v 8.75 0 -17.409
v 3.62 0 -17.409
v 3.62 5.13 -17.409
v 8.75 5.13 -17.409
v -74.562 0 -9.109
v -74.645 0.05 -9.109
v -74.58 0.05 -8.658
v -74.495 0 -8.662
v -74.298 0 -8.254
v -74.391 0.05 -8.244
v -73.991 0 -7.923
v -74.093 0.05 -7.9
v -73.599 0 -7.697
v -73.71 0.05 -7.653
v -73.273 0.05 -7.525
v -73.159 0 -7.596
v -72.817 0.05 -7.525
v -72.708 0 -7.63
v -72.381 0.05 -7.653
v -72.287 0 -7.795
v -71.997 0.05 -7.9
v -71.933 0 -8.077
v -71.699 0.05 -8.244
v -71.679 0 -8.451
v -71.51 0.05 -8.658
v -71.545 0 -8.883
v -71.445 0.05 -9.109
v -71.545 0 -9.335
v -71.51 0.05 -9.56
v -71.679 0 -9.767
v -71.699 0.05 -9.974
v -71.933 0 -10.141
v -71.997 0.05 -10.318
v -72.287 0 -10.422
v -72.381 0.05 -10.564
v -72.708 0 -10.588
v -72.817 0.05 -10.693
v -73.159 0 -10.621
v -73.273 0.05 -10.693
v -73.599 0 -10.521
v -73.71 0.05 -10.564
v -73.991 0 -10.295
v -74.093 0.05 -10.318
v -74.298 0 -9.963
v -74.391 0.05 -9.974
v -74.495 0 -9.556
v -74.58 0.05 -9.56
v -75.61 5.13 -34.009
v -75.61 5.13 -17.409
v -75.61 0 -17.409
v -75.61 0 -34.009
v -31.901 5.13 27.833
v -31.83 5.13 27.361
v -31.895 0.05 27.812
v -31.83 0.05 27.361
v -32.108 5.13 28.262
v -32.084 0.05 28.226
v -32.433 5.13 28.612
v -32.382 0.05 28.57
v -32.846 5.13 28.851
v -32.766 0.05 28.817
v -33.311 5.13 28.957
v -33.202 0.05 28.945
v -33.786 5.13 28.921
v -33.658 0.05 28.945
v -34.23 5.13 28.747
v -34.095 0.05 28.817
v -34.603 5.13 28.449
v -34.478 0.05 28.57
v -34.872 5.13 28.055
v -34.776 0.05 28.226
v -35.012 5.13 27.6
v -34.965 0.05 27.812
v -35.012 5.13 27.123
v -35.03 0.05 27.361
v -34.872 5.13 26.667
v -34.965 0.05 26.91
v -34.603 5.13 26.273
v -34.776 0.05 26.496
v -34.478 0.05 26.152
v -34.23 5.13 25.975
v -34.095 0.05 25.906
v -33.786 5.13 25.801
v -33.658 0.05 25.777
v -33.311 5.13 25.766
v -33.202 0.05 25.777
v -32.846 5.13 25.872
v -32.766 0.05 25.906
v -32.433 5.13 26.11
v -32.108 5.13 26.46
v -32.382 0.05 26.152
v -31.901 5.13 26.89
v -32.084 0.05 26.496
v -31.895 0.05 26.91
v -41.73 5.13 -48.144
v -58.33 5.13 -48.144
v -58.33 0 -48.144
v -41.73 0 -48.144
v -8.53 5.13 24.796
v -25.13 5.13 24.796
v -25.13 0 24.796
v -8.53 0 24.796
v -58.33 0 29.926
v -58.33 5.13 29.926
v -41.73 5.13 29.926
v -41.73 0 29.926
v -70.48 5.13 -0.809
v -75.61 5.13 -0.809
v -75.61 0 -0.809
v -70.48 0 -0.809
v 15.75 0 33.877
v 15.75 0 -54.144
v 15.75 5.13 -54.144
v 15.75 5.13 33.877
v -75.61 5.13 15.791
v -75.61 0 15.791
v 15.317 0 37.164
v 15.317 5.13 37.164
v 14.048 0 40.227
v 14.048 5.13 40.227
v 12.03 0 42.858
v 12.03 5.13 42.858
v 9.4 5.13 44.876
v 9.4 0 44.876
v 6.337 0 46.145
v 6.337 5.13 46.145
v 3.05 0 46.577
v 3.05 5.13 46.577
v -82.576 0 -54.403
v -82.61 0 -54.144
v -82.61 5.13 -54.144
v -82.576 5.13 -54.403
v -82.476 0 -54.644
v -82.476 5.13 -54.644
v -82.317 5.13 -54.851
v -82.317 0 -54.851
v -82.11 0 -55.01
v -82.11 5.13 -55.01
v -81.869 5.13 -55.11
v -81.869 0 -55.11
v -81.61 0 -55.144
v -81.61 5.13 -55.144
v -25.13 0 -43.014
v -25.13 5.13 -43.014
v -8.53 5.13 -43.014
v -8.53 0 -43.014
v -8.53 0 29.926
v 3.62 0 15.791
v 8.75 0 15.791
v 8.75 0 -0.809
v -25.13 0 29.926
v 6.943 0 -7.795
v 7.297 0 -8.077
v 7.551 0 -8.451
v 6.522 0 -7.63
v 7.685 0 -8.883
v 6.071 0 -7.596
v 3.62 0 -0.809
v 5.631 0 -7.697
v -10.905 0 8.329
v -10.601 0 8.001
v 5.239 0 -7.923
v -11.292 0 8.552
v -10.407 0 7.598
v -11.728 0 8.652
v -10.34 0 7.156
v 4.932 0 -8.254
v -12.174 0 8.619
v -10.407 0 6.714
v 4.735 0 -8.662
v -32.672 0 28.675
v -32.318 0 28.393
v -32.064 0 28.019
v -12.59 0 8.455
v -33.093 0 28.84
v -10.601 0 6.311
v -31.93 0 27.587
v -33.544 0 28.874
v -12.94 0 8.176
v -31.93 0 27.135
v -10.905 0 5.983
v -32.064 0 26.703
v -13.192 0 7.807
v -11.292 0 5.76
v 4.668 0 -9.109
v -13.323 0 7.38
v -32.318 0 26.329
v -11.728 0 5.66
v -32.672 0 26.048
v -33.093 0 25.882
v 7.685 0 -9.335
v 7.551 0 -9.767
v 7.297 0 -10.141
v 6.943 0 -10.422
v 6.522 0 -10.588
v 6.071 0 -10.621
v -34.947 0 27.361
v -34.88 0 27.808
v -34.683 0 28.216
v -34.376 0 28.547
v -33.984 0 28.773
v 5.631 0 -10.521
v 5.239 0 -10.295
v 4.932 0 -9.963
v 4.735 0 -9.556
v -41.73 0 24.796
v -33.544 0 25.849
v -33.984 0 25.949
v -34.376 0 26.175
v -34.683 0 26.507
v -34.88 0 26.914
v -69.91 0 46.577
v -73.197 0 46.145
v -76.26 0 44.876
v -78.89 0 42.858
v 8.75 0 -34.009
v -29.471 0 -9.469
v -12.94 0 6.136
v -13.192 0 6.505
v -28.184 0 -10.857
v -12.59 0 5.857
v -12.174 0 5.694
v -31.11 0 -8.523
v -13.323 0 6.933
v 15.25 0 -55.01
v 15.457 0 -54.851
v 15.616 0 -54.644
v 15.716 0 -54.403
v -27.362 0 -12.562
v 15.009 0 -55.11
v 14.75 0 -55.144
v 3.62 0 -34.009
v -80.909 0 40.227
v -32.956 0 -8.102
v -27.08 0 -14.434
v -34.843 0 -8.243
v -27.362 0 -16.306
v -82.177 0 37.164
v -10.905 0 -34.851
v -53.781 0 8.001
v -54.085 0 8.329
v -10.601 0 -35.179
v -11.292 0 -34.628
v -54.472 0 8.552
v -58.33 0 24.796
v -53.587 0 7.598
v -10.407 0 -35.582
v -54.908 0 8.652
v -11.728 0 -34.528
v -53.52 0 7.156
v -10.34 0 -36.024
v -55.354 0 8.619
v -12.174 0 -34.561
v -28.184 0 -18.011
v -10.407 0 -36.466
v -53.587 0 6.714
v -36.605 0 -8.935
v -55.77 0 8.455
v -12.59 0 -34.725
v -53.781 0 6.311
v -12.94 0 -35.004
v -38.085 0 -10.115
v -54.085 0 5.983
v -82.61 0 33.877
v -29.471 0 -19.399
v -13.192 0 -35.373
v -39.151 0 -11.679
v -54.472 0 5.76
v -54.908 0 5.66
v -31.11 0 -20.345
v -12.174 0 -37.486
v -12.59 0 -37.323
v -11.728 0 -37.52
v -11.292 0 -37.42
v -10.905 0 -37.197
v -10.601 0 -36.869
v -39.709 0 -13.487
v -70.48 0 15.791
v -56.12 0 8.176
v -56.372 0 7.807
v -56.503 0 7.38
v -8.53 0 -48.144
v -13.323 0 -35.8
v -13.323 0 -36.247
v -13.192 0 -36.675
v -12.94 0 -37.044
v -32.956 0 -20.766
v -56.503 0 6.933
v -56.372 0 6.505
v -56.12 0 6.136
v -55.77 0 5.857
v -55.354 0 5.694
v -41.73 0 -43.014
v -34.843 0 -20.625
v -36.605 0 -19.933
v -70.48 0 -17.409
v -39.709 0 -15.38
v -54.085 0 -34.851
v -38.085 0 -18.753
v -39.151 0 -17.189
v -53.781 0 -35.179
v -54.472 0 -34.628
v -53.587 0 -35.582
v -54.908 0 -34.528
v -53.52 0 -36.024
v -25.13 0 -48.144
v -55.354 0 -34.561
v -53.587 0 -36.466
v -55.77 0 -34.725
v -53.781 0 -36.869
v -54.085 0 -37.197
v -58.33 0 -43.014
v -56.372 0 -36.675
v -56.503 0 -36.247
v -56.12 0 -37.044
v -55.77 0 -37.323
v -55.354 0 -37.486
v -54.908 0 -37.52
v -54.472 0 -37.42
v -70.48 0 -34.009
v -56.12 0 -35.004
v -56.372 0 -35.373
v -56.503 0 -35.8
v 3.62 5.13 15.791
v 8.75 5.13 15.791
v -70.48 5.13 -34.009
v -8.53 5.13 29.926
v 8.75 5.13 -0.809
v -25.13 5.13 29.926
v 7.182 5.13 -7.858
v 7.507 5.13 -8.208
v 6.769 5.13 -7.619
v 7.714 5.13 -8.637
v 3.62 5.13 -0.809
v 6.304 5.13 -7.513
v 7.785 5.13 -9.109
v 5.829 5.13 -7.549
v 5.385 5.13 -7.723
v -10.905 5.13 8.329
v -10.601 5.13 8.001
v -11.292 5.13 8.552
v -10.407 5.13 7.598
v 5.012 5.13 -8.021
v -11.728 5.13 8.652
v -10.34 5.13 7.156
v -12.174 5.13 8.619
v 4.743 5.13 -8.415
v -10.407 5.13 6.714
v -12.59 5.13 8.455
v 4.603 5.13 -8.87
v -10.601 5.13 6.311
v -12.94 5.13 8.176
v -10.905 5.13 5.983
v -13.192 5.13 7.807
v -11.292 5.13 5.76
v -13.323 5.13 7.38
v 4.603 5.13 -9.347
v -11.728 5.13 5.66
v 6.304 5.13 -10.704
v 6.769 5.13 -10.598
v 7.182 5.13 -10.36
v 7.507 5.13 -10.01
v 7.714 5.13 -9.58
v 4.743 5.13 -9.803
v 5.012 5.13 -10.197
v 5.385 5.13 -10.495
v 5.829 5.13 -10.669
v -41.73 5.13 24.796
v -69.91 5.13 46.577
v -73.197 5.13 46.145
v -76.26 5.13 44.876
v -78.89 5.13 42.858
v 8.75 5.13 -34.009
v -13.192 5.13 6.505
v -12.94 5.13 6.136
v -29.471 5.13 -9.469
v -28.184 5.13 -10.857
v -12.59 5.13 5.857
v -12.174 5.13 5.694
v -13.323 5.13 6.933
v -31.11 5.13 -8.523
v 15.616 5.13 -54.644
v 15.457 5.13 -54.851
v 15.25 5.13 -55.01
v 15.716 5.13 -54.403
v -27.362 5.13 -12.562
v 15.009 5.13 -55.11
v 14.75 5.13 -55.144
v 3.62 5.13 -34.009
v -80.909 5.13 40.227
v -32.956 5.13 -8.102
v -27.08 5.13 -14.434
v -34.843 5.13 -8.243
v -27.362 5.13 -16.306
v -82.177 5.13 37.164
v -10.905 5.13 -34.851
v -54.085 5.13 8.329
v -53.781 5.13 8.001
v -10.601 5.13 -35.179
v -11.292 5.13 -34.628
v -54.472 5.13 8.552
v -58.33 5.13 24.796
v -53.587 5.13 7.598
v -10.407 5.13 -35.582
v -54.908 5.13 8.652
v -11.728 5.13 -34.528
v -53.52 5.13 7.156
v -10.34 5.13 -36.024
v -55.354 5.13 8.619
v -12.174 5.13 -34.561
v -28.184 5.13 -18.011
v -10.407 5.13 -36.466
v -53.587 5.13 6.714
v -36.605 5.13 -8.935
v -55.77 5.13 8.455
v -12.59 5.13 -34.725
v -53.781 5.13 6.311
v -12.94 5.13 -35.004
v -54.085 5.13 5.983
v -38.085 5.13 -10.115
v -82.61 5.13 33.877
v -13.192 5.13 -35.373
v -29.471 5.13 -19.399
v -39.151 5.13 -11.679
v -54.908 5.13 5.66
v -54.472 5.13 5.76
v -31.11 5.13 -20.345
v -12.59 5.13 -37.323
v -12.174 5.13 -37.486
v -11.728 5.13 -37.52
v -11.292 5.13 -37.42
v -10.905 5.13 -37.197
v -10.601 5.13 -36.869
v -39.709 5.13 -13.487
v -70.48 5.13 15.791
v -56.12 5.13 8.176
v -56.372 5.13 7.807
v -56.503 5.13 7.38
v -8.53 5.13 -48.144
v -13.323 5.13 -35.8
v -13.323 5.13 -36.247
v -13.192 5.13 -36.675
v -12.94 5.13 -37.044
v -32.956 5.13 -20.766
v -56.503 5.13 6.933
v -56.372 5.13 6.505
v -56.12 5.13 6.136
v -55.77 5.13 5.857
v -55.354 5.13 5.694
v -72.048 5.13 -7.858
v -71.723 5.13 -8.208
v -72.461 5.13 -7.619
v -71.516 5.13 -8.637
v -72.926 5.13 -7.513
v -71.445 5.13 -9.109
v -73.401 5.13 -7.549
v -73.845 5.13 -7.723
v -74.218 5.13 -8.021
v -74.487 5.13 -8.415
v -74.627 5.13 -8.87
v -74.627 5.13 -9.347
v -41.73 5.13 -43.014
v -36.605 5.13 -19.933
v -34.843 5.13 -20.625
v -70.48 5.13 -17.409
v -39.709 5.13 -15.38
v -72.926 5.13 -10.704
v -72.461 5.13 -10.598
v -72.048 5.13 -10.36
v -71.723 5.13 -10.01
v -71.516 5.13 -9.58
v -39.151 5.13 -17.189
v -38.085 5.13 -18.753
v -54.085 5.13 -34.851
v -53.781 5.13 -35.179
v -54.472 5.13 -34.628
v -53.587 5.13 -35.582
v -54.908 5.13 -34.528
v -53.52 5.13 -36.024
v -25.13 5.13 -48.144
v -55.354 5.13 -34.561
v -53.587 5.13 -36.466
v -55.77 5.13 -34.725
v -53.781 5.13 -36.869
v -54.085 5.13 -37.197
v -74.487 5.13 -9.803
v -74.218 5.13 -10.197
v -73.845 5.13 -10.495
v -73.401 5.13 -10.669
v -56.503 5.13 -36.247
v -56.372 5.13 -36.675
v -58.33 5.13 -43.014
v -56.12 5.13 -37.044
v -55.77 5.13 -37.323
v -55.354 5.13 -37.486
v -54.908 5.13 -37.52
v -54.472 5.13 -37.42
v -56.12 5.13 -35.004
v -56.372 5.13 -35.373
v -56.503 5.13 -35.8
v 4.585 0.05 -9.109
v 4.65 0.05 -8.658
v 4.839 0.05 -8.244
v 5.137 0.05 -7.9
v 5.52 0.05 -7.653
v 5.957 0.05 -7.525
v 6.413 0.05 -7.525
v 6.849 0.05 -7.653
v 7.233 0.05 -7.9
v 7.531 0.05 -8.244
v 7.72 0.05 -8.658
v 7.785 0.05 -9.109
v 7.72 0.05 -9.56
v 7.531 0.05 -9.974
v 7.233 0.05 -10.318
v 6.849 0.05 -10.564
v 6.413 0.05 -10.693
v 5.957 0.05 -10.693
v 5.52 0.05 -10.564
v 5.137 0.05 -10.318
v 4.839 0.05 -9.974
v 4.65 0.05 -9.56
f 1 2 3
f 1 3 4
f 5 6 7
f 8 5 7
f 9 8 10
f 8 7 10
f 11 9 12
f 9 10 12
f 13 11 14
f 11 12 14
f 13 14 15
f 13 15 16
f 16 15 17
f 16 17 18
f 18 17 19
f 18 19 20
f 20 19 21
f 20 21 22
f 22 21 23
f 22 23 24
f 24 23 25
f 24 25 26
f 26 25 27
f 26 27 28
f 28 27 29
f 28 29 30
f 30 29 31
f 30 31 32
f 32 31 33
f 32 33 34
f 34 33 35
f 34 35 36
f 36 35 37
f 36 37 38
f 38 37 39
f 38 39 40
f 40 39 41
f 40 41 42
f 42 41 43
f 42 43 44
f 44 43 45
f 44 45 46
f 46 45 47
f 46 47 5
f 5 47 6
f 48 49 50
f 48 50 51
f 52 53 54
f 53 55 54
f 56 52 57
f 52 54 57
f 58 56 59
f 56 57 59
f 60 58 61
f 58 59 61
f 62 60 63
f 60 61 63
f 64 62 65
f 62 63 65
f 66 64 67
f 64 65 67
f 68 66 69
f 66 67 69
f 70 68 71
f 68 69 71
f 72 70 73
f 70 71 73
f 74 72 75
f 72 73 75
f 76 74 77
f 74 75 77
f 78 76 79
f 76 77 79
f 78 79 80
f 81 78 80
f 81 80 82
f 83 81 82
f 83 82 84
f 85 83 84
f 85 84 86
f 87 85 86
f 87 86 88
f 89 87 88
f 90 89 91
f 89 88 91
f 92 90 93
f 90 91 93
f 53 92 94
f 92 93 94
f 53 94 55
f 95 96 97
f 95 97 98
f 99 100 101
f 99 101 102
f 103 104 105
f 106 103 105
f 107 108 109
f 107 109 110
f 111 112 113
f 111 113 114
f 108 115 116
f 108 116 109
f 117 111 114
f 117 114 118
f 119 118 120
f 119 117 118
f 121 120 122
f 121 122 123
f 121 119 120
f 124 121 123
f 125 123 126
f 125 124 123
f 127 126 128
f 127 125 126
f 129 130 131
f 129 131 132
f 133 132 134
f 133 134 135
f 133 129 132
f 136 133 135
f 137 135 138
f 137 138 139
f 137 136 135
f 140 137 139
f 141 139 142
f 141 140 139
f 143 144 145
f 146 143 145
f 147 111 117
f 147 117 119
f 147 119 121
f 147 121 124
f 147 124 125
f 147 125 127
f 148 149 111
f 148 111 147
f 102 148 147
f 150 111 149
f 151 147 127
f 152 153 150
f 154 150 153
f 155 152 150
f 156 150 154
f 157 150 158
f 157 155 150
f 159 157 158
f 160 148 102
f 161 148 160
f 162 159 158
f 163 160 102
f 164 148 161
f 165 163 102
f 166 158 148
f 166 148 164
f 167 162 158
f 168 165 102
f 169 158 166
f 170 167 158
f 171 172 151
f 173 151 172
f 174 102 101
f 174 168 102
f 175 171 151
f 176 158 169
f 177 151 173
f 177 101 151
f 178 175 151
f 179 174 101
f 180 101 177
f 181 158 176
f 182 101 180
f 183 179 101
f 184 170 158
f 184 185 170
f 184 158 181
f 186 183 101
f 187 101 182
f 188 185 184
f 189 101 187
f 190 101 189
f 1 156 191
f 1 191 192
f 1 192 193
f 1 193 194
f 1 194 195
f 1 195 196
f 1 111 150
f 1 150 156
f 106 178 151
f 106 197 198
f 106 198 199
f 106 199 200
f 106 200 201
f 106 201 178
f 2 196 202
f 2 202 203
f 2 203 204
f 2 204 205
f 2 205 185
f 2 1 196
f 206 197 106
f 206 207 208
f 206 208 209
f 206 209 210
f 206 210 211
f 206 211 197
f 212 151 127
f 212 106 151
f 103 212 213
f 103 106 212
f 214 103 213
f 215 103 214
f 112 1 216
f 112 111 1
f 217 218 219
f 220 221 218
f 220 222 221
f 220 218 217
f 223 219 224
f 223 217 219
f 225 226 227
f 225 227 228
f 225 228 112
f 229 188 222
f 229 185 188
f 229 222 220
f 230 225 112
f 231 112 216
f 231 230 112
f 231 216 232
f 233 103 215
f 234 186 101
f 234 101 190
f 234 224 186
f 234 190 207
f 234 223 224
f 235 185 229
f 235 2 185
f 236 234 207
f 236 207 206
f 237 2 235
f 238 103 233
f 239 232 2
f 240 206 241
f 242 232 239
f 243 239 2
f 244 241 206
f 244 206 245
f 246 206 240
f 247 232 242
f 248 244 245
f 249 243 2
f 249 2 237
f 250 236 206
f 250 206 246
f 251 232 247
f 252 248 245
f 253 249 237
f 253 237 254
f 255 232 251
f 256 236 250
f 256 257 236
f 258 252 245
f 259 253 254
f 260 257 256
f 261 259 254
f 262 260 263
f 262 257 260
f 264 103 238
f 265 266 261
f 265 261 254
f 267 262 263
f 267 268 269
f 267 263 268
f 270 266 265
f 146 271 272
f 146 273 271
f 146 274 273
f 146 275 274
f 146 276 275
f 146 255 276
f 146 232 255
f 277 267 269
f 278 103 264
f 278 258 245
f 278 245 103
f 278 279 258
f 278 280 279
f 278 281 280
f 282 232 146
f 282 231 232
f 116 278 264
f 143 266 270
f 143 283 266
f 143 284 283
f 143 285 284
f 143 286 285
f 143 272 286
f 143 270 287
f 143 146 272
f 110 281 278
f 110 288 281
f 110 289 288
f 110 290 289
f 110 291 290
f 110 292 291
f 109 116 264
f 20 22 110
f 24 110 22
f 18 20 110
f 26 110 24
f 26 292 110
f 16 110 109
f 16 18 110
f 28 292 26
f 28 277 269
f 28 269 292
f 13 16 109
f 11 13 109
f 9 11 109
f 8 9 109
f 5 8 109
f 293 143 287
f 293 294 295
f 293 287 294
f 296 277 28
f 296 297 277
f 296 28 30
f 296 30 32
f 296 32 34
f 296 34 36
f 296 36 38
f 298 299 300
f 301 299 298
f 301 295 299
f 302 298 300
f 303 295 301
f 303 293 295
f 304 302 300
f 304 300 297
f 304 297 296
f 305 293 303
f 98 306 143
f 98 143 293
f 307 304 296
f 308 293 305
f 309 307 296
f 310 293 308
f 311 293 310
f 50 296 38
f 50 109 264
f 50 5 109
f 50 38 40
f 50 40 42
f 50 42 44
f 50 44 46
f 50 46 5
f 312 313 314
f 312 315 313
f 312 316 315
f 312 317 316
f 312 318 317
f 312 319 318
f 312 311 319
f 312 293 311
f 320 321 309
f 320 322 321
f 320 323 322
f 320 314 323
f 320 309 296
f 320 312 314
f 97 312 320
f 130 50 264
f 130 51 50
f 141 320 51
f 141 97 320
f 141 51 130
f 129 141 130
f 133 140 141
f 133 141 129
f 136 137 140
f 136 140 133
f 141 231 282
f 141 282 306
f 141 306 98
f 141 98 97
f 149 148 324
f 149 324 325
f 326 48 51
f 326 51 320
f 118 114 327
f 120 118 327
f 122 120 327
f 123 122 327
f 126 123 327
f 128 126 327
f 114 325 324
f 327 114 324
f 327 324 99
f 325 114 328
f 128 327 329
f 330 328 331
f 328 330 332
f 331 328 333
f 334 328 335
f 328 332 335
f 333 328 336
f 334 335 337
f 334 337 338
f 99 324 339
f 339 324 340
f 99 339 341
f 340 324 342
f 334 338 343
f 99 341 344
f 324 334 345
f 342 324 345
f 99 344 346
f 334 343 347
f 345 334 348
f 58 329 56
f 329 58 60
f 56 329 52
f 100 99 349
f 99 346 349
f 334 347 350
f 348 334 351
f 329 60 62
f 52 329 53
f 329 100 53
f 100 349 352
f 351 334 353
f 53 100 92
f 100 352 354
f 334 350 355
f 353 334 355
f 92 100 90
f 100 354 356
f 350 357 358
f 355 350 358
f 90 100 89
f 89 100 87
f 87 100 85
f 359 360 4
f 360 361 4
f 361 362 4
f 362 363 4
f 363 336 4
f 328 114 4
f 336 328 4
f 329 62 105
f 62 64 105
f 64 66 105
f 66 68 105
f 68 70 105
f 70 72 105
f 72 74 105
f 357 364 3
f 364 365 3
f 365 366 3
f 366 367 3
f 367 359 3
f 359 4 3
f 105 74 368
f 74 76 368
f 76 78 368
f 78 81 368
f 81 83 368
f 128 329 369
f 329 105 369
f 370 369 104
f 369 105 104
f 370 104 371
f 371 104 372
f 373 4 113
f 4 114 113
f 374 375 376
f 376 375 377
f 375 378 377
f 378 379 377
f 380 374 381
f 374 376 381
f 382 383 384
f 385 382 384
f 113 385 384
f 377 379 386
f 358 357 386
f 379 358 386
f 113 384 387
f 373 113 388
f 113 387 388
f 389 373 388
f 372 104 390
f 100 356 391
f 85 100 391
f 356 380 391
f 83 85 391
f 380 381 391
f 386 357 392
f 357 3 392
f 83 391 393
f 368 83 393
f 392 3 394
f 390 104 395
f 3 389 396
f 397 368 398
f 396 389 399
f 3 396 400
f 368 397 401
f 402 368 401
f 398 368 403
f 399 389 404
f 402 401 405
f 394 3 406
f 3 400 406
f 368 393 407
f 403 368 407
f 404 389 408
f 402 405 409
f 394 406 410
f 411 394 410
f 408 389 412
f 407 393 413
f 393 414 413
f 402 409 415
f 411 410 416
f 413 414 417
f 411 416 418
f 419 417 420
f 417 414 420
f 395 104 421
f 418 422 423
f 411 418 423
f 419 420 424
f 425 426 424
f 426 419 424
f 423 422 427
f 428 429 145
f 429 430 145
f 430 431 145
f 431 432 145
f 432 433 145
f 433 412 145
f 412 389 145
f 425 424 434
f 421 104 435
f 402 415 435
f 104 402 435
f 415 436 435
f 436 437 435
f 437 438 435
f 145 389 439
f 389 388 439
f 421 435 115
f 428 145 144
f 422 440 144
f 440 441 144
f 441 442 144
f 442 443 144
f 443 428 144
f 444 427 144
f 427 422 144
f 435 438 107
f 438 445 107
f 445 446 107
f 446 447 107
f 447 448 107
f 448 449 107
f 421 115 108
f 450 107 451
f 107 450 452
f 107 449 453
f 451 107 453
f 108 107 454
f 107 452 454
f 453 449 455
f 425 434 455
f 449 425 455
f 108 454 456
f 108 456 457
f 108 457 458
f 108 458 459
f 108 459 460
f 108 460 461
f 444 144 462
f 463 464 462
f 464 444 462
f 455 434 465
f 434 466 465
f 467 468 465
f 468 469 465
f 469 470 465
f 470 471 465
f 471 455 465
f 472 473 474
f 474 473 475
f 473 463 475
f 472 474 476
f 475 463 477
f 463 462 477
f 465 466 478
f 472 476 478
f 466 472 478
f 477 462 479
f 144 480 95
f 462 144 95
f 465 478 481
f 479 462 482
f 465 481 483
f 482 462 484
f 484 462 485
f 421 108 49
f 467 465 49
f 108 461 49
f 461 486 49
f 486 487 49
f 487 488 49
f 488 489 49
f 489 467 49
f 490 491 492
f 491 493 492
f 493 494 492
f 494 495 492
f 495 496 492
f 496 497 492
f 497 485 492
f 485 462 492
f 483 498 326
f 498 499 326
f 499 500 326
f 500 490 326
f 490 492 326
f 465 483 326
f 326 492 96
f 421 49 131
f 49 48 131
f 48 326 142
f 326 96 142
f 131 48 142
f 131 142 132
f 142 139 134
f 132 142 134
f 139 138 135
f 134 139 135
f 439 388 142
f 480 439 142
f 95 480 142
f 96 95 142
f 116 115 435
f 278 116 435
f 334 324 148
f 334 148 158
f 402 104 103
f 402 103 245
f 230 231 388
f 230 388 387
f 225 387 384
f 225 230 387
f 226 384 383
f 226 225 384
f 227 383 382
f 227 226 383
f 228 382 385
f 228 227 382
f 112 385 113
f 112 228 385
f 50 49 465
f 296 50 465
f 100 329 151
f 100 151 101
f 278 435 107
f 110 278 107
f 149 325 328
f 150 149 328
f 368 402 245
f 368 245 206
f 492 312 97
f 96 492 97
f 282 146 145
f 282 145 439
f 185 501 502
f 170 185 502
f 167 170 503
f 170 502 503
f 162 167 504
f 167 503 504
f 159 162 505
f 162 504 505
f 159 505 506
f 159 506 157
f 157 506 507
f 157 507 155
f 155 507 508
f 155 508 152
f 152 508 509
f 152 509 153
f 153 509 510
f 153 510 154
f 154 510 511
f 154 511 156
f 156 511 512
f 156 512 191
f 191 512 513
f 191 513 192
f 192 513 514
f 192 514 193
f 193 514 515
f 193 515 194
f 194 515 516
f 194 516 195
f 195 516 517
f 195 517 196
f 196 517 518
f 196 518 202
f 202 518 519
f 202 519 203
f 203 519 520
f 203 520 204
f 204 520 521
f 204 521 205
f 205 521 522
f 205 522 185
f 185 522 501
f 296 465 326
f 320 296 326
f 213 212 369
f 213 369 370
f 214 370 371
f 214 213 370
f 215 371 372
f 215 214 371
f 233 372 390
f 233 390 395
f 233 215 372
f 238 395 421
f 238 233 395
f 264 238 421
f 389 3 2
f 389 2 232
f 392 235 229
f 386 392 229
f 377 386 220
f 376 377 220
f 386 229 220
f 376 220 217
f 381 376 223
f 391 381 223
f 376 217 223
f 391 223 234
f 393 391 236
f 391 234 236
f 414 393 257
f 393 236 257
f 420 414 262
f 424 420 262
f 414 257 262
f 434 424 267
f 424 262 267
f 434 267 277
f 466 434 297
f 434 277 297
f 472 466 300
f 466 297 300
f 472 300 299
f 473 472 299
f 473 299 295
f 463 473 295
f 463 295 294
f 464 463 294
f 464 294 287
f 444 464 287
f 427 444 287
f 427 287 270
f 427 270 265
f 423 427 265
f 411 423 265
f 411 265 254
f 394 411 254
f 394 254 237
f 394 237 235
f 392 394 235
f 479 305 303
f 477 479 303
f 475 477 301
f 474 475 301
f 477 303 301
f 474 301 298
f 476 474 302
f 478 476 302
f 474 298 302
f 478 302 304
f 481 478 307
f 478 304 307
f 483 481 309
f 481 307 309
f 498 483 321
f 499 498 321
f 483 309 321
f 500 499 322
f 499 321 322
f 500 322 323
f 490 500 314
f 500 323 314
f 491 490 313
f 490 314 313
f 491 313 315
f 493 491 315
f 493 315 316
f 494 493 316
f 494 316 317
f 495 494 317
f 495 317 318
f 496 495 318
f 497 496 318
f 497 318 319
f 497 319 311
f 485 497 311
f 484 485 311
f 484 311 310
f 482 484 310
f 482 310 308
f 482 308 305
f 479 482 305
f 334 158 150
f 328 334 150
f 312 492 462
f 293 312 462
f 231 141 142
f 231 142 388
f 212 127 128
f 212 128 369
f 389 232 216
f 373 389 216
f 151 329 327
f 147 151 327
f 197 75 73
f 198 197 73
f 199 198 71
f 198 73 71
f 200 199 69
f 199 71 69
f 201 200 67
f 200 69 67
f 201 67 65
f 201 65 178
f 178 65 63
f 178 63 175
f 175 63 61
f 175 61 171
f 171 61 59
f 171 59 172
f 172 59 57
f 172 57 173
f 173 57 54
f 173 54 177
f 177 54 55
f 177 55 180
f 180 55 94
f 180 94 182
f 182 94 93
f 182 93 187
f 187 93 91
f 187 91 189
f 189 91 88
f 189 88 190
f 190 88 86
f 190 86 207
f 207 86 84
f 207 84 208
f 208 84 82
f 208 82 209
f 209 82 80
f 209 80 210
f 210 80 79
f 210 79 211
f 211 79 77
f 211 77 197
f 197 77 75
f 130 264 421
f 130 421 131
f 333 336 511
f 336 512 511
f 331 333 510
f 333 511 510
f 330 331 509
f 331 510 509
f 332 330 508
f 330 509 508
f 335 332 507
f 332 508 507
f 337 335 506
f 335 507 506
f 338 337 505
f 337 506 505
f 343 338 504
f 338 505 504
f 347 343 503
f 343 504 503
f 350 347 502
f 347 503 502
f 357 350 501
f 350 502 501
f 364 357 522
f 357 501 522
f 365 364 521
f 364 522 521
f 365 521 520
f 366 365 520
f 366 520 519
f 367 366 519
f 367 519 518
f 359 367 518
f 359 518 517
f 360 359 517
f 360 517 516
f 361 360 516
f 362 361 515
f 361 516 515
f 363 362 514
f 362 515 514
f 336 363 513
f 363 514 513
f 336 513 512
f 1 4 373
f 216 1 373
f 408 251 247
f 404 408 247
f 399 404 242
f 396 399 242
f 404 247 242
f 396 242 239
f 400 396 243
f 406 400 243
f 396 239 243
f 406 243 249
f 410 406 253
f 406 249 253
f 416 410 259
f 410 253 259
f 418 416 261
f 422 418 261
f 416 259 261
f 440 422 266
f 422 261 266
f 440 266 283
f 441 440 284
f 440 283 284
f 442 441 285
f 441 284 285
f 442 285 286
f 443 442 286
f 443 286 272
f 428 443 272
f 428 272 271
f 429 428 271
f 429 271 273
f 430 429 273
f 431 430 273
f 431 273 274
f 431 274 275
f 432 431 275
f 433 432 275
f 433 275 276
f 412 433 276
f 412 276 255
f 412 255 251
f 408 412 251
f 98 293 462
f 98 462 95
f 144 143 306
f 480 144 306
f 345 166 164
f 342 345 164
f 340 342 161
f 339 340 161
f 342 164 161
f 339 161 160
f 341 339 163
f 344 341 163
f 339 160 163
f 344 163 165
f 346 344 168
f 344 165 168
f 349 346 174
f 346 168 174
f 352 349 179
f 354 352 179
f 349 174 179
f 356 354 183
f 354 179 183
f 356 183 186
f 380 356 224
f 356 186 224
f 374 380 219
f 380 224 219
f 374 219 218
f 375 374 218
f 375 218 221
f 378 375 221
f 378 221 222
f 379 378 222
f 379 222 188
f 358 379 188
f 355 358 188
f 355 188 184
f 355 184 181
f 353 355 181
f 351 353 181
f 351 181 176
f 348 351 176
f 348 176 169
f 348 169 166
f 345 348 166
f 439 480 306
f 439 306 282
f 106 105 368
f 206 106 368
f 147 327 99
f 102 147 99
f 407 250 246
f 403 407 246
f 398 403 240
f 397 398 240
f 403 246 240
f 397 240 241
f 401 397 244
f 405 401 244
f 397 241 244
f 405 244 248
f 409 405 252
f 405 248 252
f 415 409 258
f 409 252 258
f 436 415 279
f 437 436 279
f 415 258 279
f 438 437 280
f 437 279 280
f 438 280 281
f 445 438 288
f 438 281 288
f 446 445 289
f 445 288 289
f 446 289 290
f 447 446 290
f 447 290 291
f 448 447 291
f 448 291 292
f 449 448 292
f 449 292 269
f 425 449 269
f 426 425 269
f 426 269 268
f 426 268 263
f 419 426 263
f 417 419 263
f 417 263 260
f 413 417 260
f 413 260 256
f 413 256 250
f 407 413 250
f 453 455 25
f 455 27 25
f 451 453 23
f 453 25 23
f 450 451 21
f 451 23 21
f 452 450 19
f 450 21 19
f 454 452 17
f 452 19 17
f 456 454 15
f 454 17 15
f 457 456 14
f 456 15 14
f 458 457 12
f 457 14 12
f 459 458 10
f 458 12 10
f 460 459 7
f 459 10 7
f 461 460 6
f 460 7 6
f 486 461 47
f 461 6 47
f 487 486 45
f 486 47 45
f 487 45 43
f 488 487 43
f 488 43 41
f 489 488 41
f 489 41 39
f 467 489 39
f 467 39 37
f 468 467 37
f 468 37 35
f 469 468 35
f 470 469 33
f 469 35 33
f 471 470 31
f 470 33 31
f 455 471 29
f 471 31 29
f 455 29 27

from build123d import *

# Parameters (mm, degrees)
MAIN_DEPTH                     = 5.13
F_3_0_3_DIAMETER_HOLE2_D       = 3
F_3_0_3_DIAMETER_HOLE2_DEPTH   = 5.13
SKETCH4_W                      = 5.13
SKETCH4_H                      = 16.6
TEETH_HOLES_DEPTH              = 5.13
TEETH_HOLES_2_REACH            = 7.13
SKETCH5_W                      = 16.6
SKETCH5_H                      = 5.13
F_1_2_0_5_DIAMETER_HOLE1_D     = 12.7
F_1_2_0_5_DIAMETER_HOLE1_DEPTH = 5.13
M3_CLEARANCE_HOLE2_D           = 3.2
M3_CLEARANCE_HOLE2_DEPTH       = 5.08
M3_CLEARANCE_HOLE2_TIP         = 0.96137699


with BuildPart() as part:
    # Sketch1 → Main (new body)
    with BuildSketch(Plane(origin=(0, 0, 0), x_dir=(1, 0, 0), z_dir=(0, 1, 0))):
        with BuildLine():
            Line((-81.610197541, 55.143891453), (14.749802459, 55.143891453))
            ThreePointArc((14.749802459, 55.143891453), (15.456909241, 54.850998234), (15.749802459, 54.143891453))
            Line((15.749802459, 54.143891453), (15.749802459, -33.877426122))
            ThreePointArc((15.749802459, -33.877426122), (12.03005858, -42.857682243), (3.049802459, -46.577426122))
            Line((3.049802459, -46.577426122), (-69.910197541, -46.577426122))
            ThreePointArc((-69.910197541, -46.577426122), (-78.890453662, -42.857682243), (-82.610197541, -33.877426122))
            Line((-82.610197541, -33.877426122), (-82.610197541, 54.143891453))
            ThreePointArc((-82.610197541, 54.143891453), (-82.317304322, 54.850998234), (-81.610197541, 55.143891453))
        make_face()
    extrude(amount=MAIN_DEPTH)

    # Ø3.0 (3) Diameter Hole2
    with Locations(Plane(origin=(0, 5.13, 0), x_dir=(-1, 0, 0), z_dir=(0, 1, 0))):
        with Locations((55.020197541, -36.023891453), (11.840197541, -36.023891453), (55.020197541, 7.156108547), (11.840197541, 7.156108547)):
            Hole(F_3_0_3_DIAMETER_HOLE2_D / 2, depth=F_3_0_3_DIAMETER_HOLE2_DEPTH)

    # Sketch4 → Teeth holes (cut)
    with BuildSketch(Plane(origin=(0, 5.13, 0), x_dir=(1, 0, 0), z_dir=(0, 1, 0))):
        with Locations((-73.045197541, 25.708891453)):
            Rectangle(SKETCH4_W, SKETCH4_H)
        with Locations((6.184802459, 25.708891453)):
            Rectangle(SKETCH4_W, SKETCH4_H)
        with Locations((-73.045197541, -7.491108547)):
            Rectangle(SKETCH4_W, SKETCH4_H)
        with Locations((6.184802459, -7.491108547)):
            Rectangle(SKETCH4_W, SKETCH4_H)
    extrude(amount=-TEETH_HOLES_DEPTH, mode=Mode.SUBTRACT)

    # Sketch5 → Teeth holes 2 (cut, up to next)
    with BuildSketch(Plane(origin=(0, 5.13, 0), x_dir=(1, 0, 0), z_dir=(0, 1, 0)), mode=Mode.PRIVATE) as teeth_holes_2_sk1:
        with Locations((-50.030197541, 45.578891453)):
            Rectangle(SKETCH5_W, SKETCH5_H)
    teeth_holes_2_tool1 = extrude(teeth_holes_2_sk1.sketch, amount=-TEETH_HOLES_2_REACH, mode=Mode.PRIVATE) & part.part
    add(teeth_holes_2_tool1.solids().sort_by_distance((-50.030198, 5.13, -45.578891))[0], mode=Mode.SUBTRACT)
    # Sketch5 → Teeth holes 2 (cut, up to next)
    with BuildSketch(Plane(origin=(0, 5.13, 0), x_dir=(1, 0, 0), z_dir=(0, 1, 0)), mode=Mode.PRIVATE) as teeth_holes_2_sk2:
        with Locations((-16.830197541, 45.578891453)):
            Rectangle(SKETCH5_W, SKETCH5_H)
    teeth_holes_2_tool2 = extrude(teeth_holes_2_sk2.sketch, amount=-TEETH_HOLES_2_REACH, mode=Mode.PRIVATE) & part.part
    add(teeth_holes_2_tool2.solids().sort_by_distance((-16.830198, 5.13, -45.578891))[0], mode=Mode.SUBTRACT)
    # Sketch5 → Teeth holes 2 (cut, up to next)
    with BuildSketch(Plane(origin=(0, 5.13, 0), x_dir=(1, 0, 0), z_dir=(0, 1, 0)), mode=Mode.PRIVATE) as teeth_holes_2_sk3:
        with Locations((-50.030197541, -27.361108547)):
            Rectangle(SKETCH5_W, SKETCH5_H)
    teeth_holes_2_tool3 = extrude(teeth_holes_2_sk3.sketch, amount=-TEETH_HOLES_2_REACH, mode=Mode.PRIVATE) & part.part
    add(teeth_holes_2_tool3.solids().sort_by_distance((-50.030198, 5.13, 27.361109))[0], mode=Mode.SUBTRACT)
    # Sketch5 → Teeth holes 2 (cut, up to next)
    with BuildSketch(Plane(origin=(0, 5.13, 0), x_dir=(1, 0, 0), z_dir=(0, 1, 0)), mode=Mode.PRIVATE) as teeth_holes_2_sk4:
        with Locations((-16.830197541, -27.361108547)):
            Rectangle(SKETCH5_W, SKETCH5_H)
    teeth_holes_2_tool4 = extrude(teeth_holes_2_sk4.sketch, amount=-TEETH_HOLES_2_REACH, mode=Mode.PRIVATE) & part.part
    add(teeth_holes_2_tool4.solids().sort_by_distance((-16.830198, 5.13, 27.361109))[0], mode=Mode.SUBTRACT)

    # 1/2 (0.5) Diameter Hole1
    with Locations(Plane(origin=(0, 5.13, 0), x_dir=(-1, 0, 0), z_dir=(0, 1, 0))):
        with Locations((33.430197541, -14.433891453)):
            Hole(F_1_2_0_5_DIAMETER_HOLE1_D / 2, depth=F_1_2_0_5_DIAMETER_HOLE1_DEPTH)

    # M3 Clearance Hole2
    with Locations(Plane(origin=(0, 5.13, 0), x_dir=(-1, 0, 0), z_dir=(0, 1, 0))):
        with Locations((73.045197541, -9.108891453), (-6.184802459, -9.108891453), (33.430197541, 27.361108547)):
            Hole(M3_CLEARANCE_HOLE2_D / 2, depth=M3_CLEARANCE_HOLE2_DEPTH)
            with Locations((0, 0, -(M3_CLEARANCE_HOLE2_DEPTH + M3_CLEARANCE_HOLE2_TIP / 2))):  # 118° drill point
                Cone(0, M3_CLEARANCE_HOLE2_D / 2, M3_CLEARANCE_HOLE2_TIP, mode=Mode.SUBTRACT)


solid = part.part
